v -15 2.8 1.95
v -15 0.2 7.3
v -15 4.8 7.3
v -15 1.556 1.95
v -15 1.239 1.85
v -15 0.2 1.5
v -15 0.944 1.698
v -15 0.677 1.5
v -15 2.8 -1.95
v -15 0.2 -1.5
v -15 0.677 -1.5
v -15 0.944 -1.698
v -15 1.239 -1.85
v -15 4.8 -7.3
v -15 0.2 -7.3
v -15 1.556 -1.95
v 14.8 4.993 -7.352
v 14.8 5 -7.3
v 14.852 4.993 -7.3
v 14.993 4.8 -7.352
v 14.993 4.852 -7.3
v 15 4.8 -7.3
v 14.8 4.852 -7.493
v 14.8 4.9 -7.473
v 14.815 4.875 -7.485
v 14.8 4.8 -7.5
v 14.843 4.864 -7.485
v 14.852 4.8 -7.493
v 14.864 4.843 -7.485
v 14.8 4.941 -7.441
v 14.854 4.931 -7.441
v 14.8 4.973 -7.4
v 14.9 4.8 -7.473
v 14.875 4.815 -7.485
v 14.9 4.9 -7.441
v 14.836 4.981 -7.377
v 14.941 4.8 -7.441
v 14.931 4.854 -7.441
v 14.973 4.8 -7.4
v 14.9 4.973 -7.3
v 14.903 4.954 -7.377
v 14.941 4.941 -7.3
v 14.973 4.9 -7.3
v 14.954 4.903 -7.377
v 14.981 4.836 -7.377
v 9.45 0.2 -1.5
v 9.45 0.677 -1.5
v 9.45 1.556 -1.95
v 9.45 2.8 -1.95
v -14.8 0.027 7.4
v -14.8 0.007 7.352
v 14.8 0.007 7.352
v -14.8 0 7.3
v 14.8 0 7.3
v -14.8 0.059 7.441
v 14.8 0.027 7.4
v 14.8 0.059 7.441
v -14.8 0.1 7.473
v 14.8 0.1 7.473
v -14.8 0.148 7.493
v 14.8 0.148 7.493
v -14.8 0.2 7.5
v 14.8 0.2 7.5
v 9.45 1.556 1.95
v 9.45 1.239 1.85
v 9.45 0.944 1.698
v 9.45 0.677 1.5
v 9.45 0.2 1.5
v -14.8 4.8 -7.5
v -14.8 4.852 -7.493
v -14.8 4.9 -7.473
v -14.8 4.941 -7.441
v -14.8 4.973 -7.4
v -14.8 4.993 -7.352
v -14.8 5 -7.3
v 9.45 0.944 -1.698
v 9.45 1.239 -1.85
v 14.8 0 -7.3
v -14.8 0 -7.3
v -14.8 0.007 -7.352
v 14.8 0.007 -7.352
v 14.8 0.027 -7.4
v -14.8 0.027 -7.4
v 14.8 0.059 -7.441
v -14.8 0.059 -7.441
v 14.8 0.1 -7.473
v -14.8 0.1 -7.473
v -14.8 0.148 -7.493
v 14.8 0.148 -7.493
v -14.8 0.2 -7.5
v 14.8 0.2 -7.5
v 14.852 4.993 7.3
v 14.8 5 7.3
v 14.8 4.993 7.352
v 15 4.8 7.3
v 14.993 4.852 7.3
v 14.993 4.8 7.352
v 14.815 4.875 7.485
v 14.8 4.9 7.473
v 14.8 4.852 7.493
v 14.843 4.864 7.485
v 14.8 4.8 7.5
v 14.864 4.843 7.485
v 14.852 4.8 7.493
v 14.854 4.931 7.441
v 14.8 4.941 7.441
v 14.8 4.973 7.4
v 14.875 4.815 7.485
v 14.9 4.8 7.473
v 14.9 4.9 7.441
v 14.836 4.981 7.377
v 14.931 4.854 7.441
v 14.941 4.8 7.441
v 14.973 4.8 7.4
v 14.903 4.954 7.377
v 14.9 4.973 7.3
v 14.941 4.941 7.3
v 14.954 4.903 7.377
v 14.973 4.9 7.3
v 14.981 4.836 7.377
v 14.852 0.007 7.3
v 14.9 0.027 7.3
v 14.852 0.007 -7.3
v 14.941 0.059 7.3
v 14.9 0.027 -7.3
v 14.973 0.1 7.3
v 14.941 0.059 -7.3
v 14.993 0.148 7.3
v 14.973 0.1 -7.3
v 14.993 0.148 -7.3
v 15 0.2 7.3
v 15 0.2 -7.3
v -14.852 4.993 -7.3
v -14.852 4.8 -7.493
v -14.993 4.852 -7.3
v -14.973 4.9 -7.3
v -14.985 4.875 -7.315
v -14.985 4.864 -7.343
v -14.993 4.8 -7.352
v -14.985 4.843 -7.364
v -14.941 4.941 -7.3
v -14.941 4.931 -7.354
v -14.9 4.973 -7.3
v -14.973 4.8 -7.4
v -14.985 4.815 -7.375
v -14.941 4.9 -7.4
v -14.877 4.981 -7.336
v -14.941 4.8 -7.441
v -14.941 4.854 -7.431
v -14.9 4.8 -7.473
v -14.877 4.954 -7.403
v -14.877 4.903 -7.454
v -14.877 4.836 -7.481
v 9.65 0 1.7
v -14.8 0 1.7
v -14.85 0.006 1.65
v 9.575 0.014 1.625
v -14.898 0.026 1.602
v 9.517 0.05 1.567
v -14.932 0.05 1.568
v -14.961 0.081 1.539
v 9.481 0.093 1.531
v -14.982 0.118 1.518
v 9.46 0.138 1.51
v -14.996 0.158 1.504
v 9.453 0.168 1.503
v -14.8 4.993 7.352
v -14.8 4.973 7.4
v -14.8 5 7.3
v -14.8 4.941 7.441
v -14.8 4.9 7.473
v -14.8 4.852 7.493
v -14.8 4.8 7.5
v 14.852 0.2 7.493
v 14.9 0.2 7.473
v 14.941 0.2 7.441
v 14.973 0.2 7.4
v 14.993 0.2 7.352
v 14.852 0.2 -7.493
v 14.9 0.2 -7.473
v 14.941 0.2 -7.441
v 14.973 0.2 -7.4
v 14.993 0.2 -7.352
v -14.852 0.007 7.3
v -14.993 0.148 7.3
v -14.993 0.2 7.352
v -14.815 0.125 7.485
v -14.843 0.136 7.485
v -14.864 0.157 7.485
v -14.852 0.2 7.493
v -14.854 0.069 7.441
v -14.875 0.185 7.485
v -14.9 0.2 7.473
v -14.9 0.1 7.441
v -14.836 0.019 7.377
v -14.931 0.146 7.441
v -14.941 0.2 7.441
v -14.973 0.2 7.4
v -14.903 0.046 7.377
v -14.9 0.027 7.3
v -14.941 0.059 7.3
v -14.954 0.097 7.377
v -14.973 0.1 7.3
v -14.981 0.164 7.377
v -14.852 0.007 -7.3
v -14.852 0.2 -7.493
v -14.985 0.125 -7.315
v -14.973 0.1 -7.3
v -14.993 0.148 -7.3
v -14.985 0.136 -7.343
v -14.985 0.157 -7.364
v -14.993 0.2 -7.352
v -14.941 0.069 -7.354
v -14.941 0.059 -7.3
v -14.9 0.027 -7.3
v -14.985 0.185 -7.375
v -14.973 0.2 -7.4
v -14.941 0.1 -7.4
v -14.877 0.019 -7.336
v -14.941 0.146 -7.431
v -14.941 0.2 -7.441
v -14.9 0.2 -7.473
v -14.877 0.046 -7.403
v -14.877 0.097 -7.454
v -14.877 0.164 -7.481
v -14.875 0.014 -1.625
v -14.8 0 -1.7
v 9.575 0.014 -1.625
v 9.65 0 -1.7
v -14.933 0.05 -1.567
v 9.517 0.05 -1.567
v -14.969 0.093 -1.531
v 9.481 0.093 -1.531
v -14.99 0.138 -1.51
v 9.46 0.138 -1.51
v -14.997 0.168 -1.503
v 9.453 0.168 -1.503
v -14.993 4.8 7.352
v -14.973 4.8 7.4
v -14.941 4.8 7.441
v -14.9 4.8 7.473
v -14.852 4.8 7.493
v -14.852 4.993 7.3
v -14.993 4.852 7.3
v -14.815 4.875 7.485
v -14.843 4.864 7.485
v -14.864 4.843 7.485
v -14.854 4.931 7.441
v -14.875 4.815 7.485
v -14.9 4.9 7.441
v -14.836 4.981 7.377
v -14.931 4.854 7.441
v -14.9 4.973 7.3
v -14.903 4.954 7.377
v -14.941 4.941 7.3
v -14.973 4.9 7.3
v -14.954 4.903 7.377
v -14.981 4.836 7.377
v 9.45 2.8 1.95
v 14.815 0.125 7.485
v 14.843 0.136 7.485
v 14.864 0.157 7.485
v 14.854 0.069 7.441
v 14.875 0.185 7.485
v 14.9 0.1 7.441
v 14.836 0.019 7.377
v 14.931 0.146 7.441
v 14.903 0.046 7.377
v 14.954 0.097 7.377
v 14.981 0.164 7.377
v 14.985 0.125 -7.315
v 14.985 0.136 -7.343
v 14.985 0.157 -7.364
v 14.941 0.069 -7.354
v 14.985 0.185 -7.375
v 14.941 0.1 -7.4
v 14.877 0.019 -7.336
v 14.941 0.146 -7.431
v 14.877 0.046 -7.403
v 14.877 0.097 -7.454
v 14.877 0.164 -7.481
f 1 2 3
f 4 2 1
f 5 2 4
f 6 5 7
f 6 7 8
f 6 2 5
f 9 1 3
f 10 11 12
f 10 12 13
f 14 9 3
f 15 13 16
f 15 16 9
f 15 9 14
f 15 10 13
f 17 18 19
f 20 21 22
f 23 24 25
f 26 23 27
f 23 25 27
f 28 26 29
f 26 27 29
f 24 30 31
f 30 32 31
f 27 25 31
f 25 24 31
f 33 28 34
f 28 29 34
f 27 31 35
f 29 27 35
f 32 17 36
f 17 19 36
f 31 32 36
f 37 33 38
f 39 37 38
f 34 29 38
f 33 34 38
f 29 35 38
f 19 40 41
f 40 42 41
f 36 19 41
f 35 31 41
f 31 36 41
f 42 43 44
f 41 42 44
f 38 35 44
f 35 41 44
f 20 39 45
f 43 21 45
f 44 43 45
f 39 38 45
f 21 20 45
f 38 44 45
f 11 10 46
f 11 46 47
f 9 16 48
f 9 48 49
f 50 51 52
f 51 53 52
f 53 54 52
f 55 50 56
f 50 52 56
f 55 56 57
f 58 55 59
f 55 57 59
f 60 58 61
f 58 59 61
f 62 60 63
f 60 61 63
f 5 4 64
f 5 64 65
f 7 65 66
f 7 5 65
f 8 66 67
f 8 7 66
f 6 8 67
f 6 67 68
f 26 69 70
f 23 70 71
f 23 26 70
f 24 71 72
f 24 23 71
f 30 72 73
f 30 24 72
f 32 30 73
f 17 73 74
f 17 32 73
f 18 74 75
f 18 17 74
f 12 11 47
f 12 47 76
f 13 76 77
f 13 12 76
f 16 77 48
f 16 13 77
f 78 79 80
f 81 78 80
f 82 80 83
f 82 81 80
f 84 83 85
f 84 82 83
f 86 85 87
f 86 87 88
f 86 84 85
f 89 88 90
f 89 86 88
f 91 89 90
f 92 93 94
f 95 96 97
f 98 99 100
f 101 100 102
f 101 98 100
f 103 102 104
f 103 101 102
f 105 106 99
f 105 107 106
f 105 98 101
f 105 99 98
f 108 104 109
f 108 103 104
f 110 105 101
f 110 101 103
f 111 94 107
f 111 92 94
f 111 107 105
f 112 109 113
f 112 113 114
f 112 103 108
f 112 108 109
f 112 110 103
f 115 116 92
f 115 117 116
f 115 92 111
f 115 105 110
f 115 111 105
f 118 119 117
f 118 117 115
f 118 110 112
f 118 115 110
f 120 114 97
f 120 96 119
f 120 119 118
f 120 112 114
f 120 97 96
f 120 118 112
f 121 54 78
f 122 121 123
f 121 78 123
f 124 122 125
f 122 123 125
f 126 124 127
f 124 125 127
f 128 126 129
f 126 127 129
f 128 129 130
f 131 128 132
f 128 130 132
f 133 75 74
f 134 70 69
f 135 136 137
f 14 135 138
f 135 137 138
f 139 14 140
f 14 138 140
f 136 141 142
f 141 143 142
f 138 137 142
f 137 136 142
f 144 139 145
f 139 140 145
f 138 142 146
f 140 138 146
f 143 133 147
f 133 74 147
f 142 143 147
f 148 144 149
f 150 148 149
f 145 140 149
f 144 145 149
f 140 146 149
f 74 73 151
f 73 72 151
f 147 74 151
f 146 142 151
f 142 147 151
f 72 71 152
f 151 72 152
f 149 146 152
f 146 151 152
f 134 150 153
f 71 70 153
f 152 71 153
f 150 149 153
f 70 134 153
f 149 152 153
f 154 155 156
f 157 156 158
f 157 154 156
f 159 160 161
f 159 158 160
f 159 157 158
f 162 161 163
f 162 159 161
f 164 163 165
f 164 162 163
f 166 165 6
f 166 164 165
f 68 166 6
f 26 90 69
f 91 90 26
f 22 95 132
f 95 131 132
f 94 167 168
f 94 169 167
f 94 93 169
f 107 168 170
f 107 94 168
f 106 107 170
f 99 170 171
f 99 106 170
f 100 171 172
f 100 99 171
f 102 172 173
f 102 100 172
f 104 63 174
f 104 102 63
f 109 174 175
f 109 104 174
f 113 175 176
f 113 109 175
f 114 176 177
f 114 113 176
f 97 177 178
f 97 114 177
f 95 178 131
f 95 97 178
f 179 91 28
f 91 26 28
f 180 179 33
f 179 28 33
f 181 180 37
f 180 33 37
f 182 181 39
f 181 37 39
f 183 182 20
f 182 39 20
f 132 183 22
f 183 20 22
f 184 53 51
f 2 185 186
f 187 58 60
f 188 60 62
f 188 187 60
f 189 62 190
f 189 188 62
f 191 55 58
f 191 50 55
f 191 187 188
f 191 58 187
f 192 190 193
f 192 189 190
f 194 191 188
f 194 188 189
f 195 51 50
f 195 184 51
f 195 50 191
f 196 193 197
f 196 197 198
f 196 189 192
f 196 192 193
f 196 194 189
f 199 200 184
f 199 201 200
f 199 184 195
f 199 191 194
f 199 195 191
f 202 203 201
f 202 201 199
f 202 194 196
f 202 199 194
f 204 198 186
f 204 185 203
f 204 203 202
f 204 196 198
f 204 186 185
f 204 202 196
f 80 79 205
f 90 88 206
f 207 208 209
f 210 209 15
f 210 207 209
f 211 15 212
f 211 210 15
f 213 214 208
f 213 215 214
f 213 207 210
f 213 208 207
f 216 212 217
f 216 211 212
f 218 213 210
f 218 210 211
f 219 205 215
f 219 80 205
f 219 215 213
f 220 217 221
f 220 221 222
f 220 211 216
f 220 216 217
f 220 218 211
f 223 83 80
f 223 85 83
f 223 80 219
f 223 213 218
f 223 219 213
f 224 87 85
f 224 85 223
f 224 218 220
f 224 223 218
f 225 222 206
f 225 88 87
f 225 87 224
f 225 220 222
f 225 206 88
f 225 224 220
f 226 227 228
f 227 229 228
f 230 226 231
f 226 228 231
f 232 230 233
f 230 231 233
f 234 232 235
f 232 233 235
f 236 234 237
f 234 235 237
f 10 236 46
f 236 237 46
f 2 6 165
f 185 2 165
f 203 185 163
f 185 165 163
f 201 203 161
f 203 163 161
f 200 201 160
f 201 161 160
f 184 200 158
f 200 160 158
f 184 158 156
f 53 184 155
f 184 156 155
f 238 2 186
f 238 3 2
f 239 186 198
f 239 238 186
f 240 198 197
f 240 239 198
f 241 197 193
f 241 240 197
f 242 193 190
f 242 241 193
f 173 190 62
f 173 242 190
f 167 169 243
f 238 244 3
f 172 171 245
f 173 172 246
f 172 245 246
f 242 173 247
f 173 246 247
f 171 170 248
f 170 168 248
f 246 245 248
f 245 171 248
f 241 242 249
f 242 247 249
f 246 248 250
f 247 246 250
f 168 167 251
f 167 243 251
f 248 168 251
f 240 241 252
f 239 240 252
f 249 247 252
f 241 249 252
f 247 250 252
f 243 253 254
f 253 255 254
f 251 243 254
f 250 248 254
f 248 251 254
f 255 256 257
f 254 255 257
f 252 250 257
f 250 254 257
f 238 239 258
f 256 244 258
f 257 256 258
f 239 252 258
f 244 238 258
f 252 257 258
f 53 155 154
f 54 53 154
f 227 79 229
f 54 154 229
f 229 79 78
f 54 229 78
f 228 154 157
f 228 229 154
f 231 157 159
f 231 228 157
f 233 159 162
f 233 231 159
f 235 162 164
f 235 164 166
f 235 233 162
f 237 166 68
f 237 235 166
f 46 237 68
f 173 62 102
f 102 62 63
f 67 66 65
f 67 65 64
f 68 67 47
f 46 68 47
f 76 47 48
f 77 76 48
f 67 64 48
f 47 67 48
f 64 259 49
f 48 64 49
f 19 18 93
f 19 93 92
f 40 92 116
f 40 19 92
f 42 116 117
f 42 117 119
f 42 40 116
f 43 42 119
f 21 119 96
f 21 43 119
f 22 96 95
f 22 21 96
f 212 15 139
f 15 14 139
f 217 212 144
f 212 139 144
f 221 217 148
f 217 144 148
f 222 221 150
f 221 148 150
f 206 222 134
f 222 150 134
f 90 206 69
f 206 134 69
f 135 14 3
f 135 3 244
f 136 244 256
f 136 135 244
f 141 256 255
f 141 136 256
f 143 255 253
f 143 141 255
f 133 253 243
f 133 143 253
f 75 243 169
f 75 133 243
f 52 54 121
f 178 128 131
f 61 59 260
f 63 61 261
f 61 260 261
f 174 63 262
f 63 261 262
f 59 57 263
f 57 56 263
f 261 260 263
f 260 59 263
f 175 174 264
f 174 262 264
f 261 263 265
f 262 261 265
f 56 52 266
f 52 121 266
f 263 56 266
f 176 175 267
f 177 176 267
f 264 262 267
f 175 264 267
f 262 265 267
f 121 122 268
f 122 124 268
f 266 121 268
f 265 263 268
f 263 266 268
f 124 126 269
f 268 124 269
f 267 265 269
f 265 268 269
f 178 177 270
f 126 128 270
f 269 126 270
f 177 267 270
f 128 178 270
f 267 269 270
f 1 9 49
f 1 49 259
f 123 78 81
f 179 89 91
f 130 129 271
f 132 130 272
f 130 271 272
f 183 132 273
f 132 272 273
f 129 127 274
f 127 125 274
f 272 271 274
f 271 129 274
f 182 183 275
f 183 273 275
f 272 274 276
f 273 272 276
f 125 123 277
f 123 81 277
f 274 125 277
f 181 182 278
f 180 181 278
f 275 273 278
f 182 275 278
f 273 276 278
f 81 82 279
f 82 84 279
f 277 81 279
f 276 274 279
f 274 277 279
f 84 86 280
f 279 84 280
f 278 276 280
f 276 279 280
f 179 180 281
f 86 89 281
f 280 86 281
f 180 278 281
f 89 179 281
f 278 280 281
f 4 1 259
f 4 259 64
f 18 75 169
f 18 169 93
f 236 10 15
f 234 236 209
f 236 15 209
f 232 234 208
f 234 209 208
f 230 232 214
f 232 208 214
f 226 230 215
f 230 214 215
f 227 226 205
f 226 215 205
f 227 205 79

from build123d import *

# Parameters (mm, degrees)
SKETCH_1_W          = 30
SKETCH_1_H          = 15
EXTRUDE_1_DEPTH     = 5
CUT_EXTRUDE_1_DEPTH = 24.45
FILLET_1_R          = 0.2


with BuildPart() as part:
    # 草图1 → 凸台-拉伸1 (new body)
    with BuildSketch(Plane(origin=(0, 0, 0), x_dir=(1, 0, 0), z_dir=(0, 1, 0))):
        Rectangle(SKETCH_1_W, SKETCH_1_H)
    extrude(amount=EXTRUDE_1_DEPTH)

    # 草图2 → 切除-拉伸1 (cut)
    with BuildSketch(Plane.ZY.offset(15)):
        with BuildLine():
            Line((-1.5, 0), (-1.5, 0.677124344))
            ThreePointArc((-1.5, 0.677124344), (-1.780042303, 1.088161527), (-1.95, 1.555590279))
            Line((-1.95, 1.555590279), (-1.95, 2.8))
            Line((-1.95, 2.8), (1.95, 2.8))
            Line((1.95, 2.8), (1.95, 1.555590279))
            ThreePointArc((1.95, 1.555590279), (1.780042303, 1.088161527), (1.5, 0.677124344))
            Line((1.5, 0.677124344), (1.5, 0))
            Line((1.5, 0), (-1.5, 0))
        make_face()
    extrude(amount=-CUT_EXTRUDE_1_DEPTH, mode=Mode.SUBTRACT)

    # 圆角1
    fillet_1_edges = [part.edges().sort_by_distance(p)[0] for p in [
        (15, 5, 0),
        (0, 5, -7.5),
        (-15, 0, 4.5),
        (9.45, 0, 0),
        (-2.775, 0, 1.5),
        (-2.775, 0, -1.5),
        (-15, 5, 0),
        (0, 0, -7.5),
        (15, 0, 0),
        (0, 0, 7.5),
        (-15, 0, -4.5),
        (0, 5, 7.5),
        (-15, 2.5, -7.5),
        (15, 2.5, -7.5),
        (15, 2.5, 7.5),
        (-15, 2.5, 7.5),
    ]]
    fillet(fillet_1_edges, radius=FILLET_1_R)


solid = part.part
